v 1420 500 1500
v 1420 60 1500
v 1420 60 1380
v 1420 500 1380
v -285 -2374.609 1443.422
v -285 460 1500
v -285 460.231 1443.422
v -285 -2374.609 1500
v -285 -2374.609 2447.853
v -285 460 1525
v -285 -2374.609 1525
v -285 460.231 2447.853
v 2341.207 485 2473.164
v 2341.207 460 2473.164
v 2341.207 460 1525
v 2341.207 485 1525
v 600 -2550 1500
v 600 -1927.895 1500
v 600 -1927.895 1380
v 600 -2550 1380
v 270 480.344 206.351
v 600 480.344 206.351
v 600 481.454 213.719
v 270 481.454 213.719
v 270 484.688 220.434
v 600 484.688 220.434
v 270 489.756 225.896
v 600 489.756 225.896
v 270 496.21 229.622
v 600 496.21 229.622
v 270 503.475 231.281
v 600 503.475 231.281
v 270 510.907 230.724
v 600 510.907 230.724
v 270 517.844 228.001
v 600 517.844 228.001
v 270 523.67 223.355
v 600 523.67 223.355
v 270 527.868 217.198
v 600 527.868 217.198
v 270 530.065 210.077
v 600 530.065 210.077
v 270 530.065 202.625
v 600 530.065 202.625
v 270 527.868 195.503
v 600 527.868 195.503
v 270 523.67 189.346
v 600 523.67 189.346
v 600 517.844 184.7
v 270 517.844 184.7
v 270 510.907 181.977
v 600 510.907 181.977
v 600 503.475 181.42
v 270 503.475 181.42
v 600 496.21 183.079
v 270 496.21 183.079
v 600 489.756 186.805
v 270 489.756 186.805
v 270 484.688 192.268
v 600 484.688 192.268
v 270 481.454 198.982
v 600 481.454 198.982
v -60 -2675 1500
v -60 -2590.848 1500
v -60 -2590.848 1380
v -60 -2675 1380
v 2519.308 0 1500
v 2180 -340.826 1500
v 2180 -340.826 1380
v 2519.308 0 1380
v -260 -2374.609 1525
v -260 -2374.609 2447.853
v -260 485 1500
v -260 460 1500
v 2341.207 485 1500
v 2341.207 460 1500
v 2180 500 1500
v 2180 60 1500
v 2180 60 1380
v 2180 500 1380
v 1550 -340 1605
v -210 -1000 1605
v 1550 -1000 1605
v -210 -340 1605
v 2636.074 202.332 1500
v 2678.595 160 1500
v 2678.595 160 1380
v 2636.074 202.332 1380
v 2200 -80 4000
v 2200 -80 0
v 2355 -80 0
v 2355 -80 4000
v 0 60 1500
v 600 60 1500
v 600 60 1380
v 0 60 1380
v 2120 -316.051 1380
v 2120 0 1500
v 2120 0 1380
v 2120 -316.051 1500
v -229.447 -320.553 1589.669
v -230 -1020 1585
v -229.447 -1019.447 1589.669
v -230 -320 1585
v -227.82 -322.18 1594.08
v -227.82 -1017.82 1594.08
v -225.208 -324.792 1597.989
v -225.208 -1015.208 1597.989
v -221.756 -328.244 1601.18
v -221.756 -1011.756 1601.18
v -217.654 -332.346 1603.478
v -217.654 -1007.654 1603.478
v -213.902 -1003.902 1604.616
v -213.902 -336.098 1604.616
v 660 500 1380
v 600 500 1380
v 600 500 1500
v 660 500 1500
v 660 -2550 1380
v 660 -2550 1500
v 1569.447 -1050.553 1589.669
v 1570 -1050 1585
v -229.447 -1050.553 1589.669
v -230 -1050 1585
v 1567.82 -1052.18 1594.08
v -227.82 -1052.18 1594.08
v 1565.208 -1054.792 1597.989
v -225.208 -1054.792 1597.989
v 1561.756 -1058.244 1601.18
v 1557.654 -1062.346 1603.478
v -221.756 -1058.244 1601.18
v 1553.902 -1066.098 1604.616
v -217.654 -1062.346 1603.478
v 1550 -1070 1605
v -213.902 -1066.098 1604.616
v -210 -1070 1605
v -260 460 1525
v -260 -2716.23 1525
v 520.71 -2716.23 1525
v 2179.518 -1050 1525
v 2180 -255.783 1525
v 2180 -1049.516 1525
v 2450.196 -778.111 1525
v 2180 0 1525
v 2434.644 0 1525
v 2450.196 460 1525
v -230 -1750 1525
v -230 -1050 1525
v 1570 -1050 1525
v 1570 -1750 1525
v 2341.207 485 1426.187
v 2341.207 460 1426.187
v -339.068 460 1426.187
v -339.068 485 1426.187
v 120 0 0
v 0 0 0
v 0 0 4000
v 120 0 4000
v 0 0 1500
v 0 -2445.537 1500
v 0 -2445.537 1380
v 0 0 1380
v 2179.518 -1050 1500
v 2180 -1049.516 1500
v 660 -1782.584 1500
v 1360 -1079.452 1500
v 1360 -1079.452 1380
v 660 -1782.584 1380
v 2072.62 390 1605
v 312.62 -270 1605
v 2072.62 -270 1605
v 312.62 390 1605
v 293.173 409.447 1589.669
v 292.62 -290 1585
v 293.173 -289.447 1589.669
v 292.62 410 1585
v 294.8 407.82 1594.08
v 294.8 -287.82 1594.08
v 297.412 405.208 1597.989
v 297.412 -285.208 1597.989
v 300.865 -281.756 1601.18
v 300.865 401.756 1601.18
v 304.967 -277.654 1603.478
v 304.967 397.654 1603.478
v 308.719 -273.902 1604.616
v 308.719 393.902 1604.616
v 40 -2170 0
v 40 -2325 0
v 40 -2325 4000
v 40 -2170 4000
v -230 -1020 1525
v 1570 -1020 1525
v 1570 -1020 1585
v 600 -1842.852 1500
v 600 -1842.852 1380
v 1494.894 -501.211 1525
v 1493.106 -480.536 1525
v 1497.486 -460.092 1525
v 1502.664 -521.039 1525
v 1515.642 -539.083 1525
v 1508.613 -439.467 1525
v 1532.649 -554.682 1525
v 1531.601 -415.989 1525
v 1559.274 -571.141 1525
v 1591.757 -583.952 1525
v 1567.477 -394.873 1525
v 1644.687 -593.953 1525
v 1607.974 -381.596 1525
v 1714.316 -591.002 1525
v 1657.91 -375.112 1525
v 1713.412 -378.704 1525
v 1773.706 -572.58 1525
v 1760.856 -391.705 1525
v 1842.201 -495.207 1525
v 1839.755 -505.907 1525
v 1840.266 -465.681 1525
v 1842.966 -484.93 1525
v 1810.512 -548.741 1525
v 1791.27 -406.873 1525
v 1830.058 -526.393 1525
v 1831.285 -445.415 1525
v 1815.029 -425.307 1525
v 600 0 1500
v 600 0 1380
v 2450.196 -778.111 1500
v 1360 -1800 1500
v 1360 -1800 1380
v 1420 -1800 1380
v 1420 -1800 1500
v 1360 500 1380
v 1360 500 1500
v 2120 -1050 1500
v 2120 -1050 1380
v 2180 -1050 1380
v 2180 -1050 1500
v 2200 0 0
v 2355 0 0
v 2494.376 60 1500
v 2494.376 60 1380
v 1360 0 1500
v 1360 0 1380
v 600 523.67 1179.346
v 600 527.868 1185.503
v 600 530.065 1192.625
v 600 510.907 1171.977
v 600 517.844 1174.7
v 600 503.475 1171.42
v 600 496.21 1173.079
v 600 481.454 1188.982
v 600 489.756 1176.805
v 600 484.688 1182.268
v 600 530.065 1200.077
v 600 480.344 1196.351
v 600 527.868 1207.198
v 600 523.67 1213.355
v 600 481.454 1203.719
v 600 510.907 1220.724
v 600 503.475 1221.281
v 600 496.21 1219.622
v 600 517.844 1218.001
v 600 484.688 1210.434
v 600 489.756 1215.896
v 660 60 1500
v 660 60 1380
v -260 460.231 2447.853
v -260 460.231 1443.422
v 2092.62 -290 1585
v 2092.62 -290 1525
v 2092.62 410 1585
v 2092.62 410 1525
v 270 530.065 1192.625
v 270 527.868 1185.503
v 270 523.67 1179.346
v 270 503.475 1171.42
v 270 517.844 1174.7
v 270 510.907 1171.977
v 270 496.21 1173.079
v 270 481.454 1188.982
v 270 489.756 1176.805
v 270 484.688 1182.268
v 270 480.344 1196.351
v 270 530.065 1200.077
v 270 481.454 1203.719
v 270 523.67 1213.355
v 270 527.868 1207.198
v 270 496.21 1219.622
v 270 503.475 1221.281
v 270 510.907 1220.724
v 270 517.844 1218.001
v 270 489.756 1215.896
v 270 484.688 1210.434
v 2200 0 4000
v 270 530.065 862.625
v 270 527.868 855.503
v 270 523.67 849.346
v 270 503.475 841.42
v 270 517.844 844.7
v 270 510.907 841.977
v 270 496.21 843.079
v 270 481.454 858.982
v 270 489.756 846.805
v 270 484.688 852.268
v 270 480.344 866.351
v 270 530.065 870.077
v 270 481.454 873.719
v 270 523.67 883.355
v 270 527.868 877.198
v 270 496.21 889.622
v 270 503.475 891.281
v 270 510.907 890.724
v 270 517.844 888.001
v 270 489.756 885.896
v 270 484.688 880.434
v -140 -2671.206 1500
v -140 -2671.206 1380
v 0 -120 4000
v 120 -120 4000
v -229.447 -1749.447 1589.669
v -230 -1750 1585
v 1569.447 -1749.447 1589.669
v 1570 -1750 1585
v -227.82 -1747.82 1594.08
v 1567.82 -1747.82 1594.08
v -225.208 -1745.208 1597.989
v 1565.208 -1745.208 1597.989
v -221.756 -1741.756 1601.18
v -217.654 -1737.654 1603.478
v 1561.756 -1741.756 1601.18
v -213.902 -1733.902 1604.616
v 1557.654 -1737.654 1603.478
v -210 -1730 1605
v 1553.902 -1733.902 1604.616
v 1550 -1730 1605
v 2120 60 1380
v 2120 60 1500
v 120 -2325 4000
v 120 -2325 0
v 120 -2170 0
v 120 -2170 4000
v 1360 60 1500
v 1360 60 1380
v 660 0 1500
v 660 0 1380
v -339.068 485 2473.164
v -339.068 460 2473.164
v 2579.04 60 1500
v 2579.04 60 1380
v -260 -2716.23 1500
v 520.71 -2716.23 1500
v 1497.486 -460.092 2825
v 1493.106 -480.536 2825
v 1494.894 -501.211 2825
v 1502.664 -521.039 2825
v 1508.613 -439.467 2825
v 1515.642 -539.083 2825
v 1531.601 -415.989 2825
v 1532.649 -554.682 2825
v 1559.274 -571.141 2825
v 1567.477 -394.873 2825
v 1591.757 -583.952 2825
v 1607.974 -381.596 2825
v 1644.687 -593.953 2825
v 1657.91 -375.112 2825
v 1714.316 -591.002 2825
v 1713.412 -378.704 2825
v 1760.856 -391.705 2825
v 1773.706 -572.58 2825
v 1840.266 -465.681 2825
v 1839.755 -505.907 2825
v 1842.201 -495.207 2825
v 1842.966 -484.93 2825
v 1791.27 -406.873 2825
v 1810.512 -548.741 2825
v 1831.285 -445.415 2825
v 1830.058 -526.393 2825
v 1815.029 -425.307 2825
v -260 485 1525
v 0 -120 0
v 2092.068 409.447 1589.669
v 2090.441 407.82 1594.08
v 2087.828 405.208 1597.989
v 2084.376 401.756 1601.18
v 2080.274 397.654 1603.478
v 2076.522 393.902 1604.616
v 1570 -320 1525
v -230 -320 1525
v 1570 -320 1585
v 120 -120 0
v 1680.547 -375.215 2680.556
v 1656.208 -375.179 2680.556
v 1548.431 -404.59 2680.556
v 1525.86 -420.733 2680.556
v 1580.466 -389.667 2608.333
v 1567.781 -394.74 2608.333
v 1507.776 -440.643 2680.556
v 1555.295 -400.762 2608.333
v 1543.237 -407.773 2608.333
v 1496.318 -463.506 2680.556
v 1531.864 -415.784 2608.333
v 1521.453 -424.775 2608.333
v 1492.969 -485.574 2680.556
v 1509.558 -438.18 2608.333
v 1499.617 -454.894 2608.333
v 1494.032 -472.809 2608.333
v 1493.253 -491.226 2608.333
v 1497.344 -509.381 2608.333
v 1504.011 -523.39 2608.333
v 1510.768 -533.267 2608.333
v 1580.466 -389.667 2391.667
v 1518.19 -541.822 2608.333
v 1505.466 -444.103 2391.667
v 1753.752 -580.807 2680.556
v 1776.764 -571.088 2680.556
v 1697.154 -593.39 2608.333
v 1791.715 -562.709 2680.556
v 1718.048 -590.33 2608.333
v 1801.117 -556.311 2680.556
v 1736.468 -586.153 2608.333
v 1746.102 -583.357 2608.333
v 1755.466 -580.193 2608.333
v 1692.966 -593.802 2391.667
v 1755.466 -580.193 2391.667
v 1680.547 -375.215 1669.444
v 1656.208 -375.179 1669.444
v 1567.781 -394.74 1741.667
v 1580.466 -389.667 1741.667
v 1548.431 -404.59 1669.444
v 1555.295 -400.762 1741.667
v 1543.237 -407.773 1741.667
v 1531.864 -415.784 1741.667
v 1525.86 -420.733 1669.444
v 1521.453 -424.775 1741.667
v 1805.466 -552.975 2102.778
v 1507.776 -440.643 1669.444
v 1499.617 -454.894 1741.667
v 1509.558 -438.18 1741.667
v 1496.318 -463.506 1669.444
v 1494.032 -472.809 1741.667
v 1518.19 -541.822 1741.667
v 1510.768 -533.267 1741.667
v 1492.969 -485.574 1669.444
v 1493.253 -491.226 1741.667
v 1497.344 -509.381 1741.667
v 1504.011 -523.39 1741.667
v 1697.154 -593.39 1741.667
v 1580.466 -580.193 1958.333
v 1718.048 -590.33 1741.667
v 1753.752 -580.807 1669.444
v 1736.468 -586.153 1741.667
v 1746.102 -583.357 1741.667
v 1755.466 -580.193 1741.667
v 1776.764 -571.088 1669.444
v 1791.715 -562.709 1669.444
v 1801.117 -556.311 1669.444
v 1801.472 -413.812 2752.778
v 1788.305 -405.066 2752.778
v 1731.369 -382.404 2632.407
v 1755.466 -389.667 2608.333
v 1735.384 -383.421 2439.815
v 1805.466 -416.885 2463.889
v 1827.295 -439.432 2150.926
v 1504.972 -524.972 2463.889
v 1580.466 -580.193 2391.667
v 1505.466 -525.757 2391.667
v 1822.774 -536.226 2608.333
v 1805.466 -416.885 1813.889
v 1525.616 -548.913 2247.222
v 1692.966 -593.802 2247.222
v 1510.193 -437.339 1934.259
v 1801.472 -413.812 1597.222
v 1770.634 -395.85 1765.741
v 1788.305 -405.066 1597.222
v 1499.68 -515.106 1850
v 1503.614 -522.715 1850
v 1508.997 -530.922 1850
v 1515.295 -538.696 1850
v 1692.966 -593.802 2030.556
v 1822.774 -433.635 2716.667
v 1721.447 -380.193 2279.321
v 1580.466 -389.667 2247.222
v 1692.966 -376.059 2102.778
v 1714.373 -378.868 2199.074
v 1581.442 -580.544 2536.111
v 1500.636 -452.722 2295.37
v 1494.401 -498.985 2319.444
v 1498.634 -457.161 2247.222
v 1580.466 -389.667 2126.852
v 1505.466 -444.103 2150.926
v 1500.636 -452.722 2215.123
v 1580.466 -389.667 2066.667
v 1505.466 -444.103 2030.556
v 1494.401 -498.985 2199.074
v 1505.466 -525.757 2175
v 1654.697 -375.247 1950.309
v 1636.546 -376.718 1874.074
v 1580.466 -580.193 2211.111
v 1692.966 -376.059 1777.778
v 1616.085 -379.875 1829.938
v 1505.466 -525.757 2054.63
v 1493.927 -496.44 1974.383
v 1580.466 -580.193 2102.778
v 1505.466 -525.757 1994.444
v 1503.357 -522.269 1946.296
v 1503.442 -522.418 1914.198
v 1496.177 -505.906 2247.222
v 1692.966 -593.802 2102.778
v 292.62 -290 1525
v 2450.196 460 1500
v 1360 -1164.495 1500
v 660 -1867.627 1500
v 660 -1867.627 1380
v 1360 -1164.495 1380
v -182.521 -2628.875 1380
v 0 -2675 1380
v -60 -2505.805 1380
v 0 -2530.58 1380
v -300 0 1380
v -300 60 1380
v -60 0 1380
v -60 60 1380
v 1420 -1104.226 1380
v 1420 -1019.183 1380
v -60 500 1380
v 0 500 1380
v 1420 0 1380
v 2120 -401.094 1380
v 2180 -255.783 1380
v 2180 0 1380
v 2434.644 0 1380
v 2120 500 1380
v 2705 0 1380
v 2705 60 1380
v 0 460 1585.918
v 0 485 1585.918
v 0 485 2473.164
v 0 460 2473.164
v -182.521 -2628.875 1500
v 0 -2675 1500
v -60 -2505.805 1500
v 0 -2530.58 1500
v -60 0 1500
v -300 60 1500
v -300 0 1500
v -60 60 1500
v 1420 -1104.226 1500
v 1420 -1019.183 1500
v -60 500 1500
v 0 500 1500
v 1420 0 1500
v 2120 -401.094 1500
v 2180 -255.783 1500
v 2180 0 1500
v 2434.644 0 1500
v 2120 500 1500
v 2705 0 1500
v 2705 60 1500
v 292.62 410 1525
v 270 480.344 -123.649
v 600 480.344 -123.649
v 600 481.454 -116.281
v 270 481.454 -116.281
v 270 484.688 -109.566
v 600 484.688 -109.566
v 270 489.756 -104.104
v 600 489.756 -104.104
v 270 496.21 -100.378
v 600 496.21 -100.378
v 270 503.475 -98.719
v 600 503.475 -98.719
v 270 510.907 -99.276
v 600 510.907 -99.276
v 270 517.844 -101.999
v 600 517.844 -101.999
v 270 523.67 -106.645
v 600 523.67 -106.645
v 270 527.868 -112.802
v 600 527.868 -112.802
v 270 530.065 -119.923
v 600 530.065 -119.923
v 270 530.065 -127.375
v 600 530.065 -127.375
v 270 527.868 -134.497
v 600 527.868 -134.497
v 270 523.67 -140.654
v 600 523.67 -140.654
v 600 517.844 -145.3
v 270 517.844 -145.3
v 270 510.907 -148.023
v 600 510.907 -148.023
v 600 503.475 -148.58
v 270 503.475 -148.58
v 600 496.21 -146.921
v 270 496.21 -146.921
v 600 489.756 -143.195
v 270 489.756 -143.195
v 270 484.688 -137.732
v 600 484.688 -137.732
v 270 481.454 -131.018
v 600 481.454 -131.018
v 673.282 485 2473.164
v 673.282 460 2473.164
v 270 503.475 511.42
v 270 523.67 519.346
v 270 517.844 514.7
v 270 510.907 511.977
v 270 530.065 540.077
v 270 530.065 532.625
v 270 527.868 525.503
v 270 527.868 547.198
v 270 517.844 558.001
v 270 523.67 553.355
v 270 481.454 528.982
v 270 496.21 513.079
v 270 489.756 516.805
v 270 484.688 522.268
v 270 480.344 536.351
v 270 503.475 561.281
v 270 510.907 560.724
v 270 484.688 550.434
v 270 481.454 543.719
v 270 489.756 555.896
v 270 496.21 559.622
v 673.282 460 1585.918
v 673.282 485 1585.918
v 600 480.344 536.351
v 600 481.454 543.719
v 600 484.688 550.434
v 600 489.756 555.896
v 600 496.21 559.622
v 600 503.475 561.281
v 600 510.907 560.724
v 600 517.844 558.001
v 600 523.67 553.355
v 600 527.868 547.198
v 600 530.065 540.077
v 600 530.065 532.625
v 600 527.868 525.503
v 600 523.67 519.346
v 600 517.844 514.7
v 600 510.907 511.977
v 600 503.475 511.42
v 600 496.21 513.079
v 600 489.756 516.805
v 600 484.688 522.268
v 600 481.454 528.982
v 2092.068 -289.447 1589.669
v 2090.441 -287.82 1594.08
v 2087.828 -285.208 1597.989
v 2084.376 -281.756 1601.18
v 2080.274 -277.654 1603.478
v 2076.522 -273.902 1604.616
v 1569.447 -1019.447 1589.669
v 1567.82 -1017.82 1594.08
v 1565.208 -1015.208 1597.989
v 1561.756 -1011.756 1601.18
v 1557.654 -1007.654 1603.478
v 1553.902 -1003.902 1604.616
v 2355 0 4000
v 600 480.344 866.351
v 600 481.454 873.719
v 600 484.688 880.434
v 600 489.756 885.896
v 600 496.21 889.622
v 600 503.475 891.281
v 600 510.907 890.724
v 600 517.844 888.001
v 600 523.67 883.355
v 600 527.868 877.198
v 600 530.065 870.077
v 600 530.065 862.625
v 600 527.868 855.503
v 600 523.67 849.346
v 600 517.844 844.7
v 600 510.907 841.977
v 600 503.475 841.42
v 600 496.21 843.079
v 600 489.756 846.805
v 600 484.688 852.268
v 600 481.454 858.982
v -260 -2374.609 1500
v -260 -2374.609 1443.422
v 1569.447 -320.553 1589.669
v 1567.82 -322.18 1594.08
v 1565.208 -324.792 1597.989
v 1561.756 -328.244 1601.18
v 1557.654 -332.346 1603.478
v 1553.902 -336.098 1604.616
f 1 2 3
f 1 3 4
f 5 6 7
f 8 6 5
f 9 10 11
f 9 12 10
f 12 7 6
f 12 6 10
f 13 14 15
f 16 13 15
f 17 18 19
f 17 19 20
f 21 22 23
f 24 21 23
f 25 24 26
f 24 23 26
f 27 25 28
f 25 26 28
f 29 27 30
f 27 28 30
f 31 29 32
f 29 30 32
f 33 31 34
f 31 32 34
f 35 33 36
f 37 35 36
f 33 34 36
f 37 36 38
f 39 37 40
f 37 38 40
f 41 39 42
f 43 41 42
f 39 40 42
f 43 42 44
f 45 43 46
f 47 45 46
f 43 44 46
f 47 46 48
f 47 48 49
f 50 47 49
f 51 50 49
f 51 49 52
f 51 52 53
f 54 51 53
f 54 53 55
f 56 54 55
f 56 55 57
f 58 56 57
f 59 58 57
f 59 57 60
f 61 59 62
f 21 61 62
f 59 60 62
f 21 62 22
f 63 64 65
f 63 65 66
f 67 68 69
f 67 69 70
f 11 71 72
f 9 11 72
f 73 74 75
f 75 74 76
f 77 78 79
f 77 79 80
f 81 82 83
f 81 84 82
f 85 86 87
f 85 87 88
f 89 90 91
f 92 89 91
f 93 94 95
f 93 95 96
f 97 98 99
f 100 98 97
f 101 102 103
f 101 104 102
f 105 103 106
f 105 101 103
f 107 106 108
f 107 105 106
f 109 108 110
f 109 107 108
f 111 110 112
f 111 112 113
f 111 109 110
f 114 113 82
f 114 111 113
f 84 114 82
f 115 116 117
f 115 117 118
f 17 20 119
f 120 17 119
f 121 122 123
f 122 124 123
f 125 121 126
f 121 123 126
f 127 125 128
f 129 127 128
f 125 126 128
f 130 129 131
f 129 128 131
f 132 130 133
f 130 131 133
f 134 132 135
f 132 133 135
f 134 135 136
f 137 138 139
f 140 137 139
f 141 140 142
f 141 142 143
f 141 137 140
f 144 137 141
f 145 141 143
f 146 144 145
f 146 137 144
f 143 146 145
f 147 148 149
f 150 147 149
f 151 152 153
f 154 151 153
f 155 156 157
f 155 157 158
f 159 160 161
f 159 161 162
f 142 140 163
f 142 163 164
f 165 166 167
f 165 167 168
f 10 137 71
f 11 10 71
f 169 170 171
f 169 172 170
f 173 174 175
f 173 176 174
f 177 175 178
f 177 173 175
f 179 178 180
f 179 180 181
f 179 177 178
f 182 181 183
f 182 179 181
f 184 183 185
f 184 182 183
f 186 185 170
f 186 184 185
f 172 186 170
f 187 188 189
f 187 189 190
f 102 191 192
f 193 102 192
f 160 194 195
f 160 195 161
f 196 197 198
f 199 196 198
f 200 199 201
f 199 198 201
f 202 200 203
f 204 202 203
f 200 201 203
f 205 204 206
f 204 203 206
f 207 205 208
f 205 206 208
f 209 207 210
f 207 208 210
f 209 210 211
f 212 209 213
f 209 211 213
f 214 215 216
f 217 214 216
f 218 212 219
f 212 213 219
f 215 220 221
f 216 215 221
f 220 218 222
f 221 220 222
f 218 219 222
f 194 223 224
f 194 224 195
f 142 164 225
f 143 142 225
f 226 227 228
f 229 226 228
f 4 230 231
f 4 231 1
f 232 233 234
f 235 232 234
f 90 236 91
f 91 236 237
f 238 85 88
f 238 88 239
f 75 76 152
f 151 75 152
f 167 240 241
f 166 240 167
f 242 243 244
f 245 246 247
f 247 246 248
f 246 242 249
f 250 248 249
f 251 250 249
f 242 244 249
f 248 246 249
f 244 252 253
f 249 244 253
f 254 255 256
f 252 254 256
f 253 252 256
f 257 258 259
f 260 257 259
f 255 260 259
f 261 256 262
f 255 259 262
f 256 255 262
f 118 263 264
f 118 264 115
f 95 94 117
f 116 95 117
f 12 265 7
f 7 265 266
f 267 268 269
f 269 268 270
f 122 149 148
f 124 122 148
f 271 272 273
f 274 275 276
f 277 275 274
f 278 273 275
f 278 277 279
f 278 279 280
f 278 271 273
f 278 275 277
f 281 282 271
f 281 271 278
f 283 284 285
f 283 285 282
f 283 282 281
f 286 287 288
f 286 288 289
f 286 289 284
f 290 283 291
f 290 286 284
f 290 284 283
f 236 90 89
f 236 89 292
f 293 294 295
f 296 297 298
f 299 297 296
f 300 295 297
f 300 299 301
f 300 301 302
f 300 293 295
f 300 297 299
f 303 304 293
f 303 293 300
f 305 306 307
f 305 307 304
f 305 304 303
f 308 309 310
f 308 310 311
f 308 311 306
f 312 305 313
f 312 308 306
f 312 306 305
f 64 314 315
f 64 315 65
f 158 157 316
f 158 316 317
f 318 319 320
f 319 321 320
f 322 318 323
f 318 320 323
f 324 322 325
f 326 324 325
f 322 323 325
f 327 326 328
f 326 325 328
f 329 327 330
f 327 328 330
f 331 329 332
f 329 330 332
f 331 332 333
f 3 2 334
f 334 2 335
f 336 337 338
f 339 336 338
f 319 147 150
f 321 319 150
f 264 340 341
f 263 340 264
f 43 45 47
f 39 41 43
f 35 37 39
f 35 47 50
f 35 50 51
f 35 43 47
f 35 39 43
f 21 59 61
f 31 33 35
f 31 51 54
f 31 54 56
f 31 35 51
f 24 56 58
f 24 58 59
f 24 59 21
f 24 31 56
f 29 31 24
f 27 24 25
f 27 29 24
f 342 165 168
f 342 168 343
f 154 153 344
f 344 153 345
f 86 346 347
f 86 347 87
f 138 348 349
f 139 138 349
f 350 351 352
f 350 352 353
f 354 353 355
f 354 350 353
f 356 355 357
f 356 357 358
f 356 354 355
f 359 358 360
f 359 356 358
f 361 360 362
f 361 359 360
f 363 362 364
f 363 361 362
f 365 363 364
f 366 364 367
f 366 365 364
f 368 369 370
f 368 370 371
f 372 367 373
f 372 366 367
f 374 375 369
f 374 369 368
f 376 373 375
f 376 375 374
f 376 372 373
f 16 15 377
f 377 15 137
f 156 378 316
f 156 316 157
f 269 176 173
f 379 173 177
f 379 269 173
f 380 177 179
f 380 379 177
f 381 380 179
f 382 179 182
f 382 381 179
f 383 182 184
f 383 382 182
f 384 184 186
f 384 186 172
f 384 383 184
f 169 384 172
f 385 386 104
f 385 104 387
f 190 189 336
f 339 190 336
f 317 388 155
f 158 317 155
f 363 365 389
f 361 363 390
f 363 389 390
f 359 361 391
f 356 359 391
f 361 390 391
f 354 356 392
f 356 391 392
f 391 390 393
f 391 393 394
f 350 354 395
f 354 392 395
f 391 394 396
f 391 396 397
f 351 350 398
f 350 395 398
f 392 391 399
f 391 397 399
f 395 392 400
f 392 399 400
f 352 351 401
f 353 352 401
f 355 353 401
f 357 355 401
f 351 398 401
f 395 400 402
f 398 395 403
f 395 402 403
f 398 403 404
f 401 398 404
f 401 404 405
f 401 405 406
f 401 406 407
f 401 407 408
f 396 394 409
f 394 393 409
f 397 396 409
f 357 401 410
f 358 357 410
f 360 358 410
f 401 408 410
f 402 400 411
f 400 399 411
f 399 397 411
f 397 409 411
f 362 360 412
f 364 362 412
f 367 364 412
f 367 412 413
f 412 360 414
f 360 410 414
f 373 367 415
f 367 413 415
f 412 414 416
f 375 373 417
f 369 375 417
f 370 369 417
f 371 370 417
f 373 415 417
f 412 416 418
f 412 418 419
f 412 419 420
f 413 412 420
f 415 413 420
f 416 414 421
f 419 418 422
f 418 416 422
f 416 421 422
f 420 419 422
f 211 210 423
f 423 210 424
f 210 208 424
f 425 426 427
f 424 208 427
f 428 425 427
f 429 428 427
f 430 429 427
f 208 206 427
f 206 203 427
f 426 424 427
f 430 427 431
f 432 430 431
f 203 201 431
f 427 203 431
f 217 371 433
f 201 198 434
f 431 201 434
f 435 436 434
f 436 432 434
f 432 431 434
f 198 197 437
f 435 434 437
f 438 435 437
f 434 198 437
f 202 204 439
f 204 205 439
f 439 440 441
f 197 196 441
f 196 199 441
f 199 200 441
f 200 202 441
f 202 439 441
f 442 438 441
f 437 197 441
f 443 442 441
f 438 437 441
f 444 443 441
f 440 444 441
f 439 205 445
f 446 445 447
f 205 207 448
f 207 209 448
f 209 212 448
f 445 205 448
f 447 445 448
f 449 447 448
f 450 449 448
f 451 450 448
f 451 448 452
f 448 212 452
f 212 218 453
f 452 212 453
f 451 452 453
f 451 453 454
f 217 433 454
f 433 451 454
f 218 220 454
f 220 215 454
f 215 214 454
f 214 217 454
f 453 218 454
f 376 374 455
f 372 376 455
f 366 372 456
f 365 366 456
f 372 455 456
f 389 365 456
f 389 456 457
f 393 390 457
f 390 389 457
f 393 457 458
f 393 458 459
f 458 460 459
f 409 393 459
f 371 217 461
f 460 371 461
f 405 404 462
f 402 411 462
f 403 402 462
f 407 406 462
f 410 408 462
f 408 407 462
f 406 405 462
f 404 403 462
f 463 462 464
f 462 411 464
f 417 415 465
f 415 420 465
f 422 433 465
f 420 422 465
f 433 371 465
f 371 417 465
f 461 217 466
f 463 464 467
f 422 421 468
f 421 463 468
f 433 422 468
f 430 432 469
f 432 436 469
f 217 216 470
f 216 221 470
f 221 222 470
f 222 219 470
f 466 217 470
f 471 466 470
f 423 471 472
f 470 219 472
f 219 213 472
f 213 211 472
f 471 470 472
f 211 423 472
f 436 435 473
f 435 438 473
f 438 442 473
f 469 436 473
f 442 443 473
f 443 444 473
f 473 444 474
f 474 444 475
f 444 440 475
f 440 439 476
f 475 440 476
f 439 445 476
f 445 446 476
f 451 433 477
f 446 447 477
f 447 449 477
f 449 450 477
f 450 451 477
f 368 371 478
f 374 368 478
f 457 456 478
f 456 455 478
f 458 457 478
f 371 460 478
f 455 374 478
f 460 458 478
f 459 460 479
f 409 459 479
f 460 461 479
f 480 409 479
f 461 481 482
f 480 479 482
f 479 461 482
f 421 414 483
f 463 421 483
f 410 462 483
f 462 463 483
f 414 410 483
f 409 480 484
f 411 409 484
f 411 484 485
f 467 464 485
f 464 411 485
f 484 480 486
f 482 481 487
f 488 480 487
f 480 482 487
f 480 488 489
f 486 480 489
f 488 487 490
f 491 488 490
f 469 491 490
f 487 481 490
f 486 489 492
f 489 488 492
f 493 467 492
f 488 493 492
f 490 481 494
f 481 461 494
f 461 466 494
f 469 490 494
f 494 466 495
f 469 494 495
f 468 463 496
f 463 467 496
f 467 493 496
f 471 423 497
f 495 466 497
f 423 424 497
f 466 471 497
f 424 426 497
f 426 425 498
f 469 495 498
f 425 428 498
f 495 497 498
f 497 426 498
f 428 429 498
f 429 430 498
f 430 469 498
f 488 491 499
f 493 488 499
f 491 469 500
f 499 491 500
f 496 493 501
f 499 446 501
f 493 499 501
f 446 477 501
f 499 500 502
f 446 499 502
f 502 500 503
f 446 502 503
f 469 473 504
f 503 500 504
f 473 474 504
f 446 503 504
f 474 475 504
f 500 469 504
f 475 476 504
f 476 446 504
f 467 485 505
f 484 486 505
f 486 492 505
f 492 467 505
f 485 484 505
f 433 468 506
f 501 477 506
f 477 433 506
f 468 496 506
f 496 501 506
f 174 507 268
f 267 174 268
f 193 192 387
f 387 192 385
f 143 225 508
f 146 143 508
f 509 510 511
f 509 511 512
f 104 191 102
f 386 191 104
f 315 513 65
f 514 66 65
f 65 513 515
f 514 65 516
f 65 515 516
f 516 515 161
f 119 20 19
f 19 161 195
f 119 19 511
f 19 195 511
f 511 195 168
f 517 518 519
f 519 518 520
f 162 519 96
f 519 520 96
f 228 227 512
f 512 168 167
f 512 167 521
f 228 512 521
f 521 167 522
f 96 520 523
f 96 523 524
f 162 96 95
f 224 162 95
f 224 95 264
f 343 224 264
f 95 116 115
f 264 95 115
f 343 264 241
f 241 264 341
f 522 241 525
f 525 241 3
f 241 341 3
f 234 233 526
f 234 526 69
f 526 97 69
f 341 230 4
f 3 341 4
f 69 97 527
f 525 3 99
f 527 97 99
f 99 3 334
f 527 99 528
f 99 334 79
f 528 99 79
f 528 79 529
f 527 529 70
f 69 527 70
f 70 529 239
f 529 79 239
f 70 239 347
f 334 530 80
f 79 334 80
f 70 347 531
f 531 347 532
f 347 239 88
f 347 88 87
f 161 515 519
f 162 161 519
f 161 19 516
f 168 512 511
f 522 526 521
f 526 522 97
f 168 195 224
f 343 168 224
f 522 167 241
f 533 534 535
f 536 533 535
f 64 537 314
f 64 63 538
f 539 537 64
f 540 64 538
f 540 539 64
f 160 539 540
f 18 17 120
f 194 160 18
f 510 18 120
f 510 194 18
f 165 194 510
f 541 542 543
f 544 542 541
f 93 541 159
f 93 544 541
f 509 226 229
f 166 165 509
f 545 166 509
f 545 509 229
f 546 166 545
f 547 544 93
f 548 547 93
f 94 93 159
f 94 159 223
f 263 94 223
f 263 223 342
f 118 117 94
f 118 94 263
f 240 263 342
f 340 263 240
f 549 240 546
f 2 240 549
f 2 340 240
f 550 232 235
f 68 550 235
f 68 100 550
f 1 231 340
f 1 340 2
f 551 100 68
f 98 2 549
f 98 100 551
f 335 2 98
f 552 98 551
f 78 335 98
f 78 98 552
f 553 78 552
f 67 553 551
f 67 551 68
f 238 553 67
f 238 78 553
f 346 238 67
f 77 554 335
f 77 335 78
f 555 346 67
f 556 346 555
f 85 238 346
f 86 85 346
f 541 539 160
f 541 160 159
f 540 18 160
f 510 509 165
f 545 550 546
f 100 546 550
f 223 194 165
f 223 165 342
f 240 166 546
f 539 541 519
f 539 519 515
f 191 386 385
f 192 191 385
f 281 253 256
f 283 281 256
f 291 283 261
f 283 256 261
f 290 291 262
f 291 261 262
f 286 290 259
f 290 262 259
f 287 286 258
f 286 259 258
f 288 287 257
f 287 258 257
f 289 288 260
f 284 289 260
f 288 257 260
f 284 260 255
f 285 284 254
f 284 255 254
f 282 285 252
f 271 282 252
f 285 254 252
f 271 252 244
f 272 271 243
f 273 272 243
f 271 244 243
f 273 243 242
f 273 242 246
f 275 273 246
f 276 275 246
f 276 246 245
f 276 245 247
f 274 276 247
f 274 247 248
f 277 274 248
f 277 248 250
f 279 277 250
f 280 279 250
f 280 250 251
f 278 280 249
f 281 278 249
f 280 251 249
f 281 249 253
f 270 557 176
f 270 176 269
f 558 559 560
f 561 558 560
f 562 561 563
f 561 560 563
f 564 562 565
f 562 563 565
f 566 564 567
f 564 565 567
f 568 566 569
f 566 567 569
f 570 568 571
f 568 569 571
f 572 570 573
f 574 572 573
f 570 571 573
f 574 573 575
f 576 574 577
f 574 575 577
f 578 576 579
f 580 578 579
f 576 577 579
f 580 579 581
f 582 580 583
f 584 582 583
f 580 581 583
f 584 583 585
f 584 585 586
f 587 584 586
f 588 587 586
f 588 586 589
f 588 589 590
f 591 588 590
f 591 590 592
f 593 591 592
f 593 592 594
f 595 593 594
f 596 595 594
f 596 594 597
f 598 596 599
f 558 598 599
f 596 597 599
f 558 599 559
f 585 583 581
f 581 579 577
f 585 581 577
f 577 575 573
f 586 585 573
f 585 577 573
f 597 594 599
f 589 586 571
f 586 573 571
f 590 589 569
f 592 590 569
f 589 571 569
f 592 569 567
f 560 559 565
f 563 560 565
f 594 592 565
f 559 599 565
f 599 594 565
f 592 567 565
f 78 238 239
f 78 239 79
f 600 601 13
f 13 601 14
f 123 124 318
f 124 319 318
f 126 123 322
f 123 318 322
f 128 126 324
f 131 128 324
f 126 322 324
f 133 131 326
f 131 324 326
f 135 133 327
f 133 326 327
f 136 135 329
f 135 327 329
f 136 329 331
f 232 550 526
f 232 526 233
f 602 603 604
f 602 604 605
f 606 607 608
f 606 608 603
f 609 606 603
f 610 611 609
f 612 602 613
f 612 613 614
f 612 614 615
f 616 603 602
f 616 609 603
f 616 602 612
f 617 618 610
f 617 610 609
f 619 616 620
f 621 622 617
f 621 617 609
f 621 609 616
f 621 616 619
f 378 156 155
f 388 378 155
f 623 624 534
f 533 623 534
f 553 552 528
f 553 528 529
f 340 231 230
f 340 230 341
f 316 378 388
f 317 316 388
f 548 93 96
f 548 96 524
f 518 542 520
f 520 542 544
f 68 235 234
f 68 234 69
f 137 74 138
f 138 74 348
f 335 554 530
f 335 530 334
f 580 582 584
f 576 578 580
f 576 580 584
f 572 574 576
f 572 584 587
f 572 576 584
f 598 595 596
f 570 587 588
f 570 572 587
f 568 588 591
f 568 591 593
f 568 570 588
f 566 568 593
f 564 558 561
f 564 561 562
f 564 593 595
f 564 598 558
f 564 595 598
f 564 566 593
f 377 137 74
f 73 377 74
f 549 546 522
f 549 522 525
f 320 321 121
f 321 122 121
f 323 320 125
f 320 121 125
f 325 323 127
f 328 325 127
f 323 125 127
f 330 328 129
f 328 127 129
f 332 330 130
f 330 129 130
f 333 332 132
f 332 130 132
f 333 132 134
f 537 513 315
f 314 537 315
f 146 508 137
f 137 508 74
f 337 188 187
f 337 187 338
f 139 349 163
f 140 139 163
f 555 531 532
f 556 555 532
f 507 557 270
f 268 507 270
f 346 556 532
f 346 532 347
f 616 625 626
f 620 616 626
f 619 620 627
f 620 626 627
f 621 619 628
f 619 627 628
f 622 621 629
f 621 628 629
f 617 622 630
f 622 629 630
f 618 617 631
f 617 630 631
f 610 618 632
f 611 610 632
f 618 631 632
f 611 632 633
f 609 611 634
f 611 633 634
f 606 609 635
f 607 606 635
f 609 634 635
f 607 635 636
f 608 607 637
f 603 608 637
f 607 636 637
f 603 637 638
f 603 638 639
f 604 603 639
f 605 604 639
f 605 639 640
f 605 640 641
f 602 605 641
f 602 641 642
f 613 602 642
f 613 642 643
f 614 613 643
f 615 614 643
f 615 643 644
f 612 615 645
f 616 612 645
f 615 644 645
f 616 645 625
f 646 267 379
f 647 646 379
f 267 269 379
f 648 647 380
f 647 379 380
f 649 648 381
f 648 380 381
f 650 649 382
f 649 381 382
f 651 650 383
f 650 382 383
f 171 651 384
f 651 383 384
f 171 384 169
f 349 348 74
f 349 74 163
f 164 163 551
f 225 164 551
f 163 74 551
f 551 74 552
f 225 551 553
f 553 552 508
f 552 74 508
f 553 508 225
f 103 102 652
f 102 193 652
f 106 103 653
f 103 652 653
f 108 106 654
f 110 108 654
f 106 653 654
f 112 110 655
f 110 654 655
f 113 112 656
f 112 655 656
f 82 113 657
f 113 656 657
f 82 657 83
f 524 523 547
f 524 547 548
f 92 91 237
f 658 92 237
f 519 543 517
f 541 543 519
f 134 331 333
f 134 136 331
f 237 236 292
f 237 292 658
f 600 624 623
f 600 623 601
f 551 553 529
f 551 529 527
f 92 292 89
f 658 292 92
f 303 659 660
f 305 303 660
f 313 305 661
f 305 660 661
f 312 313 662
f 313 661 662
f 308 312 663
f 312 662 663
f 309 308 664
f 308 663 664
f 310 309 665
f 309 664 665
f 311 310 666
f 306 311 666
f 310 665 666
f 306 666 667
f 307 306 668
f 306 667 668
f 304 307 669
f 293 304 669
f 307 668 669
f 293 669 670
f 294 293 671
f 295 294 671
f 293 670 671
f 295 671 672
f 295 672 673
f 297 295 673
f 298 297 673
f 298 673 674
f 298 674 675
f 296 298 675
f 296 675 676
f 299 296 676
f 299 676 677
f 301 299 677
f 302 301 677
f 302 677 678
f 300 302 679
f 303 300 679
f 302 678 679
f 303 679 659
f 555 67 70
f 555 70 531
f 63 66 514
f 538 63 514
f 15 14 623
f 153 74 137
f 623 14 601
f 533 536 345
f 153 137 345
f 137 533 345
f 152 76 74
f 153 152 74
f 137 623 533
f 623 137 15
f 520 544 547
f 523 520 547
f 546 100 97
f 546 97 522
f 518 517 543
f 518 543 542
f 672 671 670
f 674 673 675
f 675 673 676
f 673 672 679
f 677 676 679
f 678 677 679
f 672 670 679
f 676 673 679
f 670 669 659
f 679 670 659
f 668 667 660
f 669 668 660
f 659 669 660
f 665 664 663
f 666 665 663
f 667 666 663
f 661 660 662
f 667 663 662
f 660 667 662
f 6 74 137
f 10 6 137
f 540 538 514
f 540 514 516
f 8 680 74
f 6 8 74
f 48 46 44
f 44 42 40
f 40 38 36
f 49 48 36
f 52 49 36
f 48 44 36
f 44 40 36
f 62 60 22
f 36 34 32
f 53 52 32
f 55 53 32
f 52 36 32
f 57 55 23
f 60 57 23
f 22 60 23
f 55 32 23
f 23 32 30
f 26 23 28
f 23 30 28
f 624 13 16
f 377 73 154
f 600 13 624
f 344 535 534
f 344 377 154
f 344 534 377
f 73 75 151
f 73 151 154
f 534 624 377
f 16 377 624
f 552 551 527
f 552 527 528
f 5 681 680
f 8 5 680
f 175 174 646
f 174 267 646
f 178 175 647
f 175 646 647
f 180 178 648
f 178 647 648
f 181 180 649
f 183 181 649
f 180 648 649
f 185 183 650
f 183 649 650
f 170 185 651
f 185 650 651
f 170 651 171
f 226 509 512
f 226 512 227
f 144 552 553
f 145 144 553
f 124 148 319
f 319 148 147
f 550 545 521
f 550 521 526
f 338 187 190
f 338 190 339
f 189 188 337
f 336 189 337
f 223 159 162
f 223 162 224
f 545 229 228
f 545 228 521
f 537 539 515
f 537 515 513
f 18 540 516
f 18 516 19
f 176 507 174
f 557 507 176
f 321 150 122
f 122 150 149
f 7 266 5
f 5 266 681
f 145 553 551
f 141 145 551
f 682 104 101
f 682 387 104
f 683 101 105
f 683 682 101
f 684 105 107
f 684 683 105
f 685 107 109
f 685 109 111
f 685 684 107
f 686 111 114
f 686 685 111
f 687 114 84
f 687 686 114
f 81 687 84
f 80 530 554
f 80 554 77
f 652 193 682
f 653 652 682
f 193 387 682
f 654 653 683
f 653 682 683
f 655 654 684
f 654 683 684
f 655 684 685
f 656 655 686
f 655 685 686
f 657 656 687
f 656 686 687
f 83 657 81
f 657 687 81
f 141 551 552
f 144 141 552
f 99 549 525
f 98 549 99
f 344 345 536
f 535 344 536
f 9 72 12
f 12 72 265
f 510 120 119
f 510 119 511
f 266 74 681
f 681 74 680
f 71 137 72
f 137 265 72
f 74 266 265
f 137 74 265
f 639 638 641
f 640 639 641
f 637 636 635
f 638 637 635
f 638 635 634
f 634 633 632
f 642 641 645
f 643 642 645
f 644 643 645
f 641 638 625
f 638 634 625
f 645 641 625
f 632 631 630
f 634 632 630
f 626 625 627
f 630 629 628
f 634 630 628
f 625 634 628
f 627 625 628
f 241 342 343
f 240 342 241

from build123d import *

# Parameters (mm, degrees)
F0_W      = 80
F0_H      = 155
F1_DEPTH  = 4000
F0_W_2    = 120
F0_H_2    = 120
F0_W_3    = 155
F0_H_3    = 80
F3_W      = 600
F3_H      = 60
F3_W_2    = 60
F3_H_2    = 440
F3_W_3    = 240
F3_W_4    = 700
F4_DEPTH  = 120
F5_W      = 200
F5_H      = 400
F5_W_2    = 270.1964569092
F5_W_3    = 700
F5_W_4    = 600
F6_DEPTH  = 25
F7_W      = 1800
F7_H      = 700
F8_DEPTH  = 80
F9_R      = 20
F9_2_R    = 20
F9_3_R    = 20
F13_DEPTH = 1300
F15_DEPTH = 25
F17_DEPTH = 25
F21_W     = 673.2819676399
F21_H     = 887.2460126877
F22_DEPTH = 25
F23_R     = 25
F24_DEPTH = 330


# Not quite as in the source:
# - a feature names something its author has since deleted; it is built from what else it names


with BuildPart() as f1:
    # F0 (on Top) → F1 (new body)
    with BuildSketch(Plane.XY):
        with Locations((80, -2247.5)):
            Rectangle(F0_W, F0_H)
    extrude(amount=F1_DEPTH)


with BuildPart() as f1b:
    # F0 (on Top) → F1, piece 2 (new body)
    with BuildSketch(Plane.XY):
        with Locations((60, -60)):
            Rectangle(F0_W_2, F0_H_2)
    extrude(amount=F1_DEPTH)


with BuildPart() as f1c:
    # F0 (on Top) → F1, piece 3 (new body)
    with BuildSketch(Plane.XY):
        with Locations((2277.5, -40)):
            Rectangle(F0_W_3, F0_H_3)
    extrude(amount=F1_DEPTH)


with BuildPart() as f4:
    # F3 (on offset) → F4 (new body)
    with BuildSketch(Plane.XY.offset(1500)):
        Polygon((-60, -2590.8482220543), (0, -2530.5797656785), (0, -2445.5369127517), (-60, -2505.8053691275), align=None)
        Polygon((-60, -2675), (0, -2675), (0, -2530.5797656785), (-60, -2590.8482220543), align=None)
        Polygon((-140, -2671.2061638888), (-60, -2590.8482220543), (-60, -2505.8053691275), (-182.5210027427, -2628.8745642763), align=None)
        Polygon((0, -2445.5369127517), (0, -2530.5797656785), (600, -1927.8952019201), (600, -1842.8523489933), align=None)
        Polygon((-60, -2505.8053691275), (0, -2445.5369127517), (0, 0), (-60, 0), align=None)
        with Locations((300, 30)):
            Rectangle(F3_W, F3_H)
        Polygon((2579.0404348737, 60), (2519.3076954527, 0), (2705, 0), (2705, 60), align=None)
        Polygon((2494.3763919822, 60), (2579.0404348737, 60), (2678.5950005752, 160), (2636.0739978325, 202.3315996125), align=None)
        Polygon((2434.6436525612, 0), (2519.3076954527, 0), (2579.0404348737, 60), (2494.3763919822, 60), align=None)
        with Locations((-30, 280)):
            Rectangle(F3_W_2, F3_H_2)
        with Locations((-180, 30)):
            Rectangle(F3_W_3, F3_H)
        with Locations((-30, 30)):
            Rectangle(F3_W_2, F3_H)
        Polygon((600, 0), (600, -1842.8523489933), (660, -1782.5838926174), (660, 0), align=None)
        Polygon((660, -1867.6267455442), (600, -1927.8952019201), (600, -2550), (660, -2550), align=None)
        Polygon((1420, -1104.2262981169), (1360, -1164.4947544928), (1360, -1800), (1420, -1800), align=None)
        Polygon((1360, 0), (1360, -1079.451901566), (1420, -1019.1834451902), (1420, 0), align=None)
        Polygon((660, -1782.5838926174), (660, -1867.6267455442), (1360, -1164.4947544928), (1360, -1079.451901566), align=None)
        Polygon((1420, -1019.1834451902), (1420, -1104.2262981169), (2120, -401.0943070655), (2120, -316.0514541387), align=None)
        Polygon((2180, -340.8258506896), (2120, -401.0943070655), (2120, -1050), (2180, -1050), align=None)
        Polygon((600, -1842.8523489933), (600, -1927.8952019201), (660, -1867.6267455442), (660, -1782.5838926174), align=None)
        Polygon((1360, -1079.451901566), (1360, -1164.4947544928), (1420, -1104.2262981169), (1420, -1019.1834451902), align=None)
        Polygon((2120, -316.0514541387), (2120, -401.0943070655), (2180, -340.8258506896), (2180, -255.7829977629), align=None)
        Polygon((2180, -255.7829977629), (2180, -340.8258506896), (2519.3076954527, 0), (2434.6436525612, 0), align=None)
        Polygon((2180, 60), (2180, 0), (2434.6436525612, 0), (2494.3763919822, 60), align=None)
        with Locations((2150, 30)):
            Rectangle(F3_W_2, F3_H)
        Polygon((2120, 0), (2120, -316.0514541387), (2180, -255.7829977629), (2180, 0), align=None)
        with Locations((2150, 280)):
            Rectangle(F3_W_2, F3_H_2)
        with Locations((1390, 280)):
            Rectangle(F3_W_2, F3_H_2)
        with Locations((1390, 30)):
            Rectangle(F3_W_2, F3_H)
        with Locations((1010, 30)):
            Rectangle(F3_W_4, F3_H)
        with Locations((630, 30)):
            Rectangle(F3_W_2, F3_H)
        with Locations((630, 280)):
            Rectangle(F3_W_2, F3_H_2)
        with Locations((1770, 30)):
            Rectangle(F3_W_4, F3_H)
    extrude(amount=-F4_DEPTH)


with BuildPart() as f6:
    # F5 (on face) → F6 (new body)
    with BuildSketch(Plane.XY.offset(1500)):
        with Locations((-160, 260)):
            Rectangle(F5_W, F5_H)
        Polygon((-60, 60), (-260, 60), (-260, 0), (-60, 0), (-60, -2505.8053691275), (-182.5210027427, -2628.8745642763), (-140, -2671.2061638888), (-60, -2590.8482220543), (-60, -2675), (0, -2675), (0, -2530.5797656785), (600, -1927.8952019201), (600, -2550), (660, -2550), (660, -1867.6267455442), (1360, -1164.4947544928), (1360, -1800), (1420, -1800), (1420, -1104.2262981169), (2120, -401.0943070655), (2120, -1050), (2179.5184463486, -1050), (2180, -1049.5162917462), (2180, -340.8258506896), (2450.1964569092, -69.4204610874), (2450.1964569092, 60), (2180, 60), (2180, 460), (2120, 460), (2120, 60), (1420, 60), (1420, 460), (1360, 460), (1360, 60), (660, 60), (660, 460), (600, 460), (600, 60), (0, 60), (0, 460), (-60, 460), align=None)
        Polygon((0, -2445.5369127517), (0, 0), (600, 0), (600, -1842.8523489933), align=None, mode=Mode.SUBTRACT)
        Polygon((1360, -1079.451901566), (660, -1782.5838926174), (660, 0), (1360, 0), align=None, mode=Mode.SUBTRACT)
        Polygon((1420, 0), (2120, 0), (2120, -316.0514541387), (1420, -1019.1834451902), align=None, mode=Mode.SUBTRACT)
        Polygon((2180, 0), (2434.6436525612, 0), (2180, -255.7829977629), align=None, mode=Mode.SUBTRACT)
        with Locations((2315.0982284546, 260)):
            Rectangle(F5_W_2, F5_H)
        Polygon((-60, 0), (-260, 0), (-260, -2716.2301540375), (520.7102529082, -2716.2301540375), (2179.5184463486, -1050), (2120, -1050), (2120, -401.0943070655), (1420, -1104.2262981169), (1420, -1800), (1360, -1800), (1360, -1164.4947544928), (660, -1867.6267455442), (660, -2550), (600, -2550), (600, -1927.8952019201), (0, -2530.5797656785), (0, -2675), (-60, -2675), (-60, -2590.8482220543), (-140, -2671.2061638888), (-182.5210027427, -2628.8745642763), (-60, -2505.8053691275), align=None)
        Polygon((2180, -340.8258506896), (2180, -1049.5162917462), (2450.1964569092, -778.1109021439), (2450.1964569092, -69.4204610874), align=None)
        Polygon((660, 0), (660, -1782.5838926174), (1360, -1079.451901566), (1360, 0), align=None)
        Polygon((2120, -316.0514541387), (2120, 0), (1420, 0), (1420, -1019.1834451902), align=None)
        with Locations((1770, 260)):
            Rectangle(F5_W_3, F5_H)
        with Locations((1010, 260)):
            Rectangle(F5_W_3, F5_H)
        with Locations((300, 260)):
            Rectangle(F5_W_4, F5_H)
        Polygon((600, 0), (0, 0), (0, -2445.5369127517), (600, -1842.8523489933), align=None)
    extrude(amount=F6_DEPTH)


with BuildPart() as f8:
    # F7 (on face) → F8 (new body)
    with BuildSketch(Plane.XY.offset(1525)):
        with Locations((1192.6203727722, 60)):
            Rectangle(F7_W, F7_H)
    extrude(amount=F8_DEPTH)

    # F9#3
    f9_3_edges = [f8.edges().sort_by_distance(p)[0] for p in [
        (1192.620373, -290, 1605),
        (292.620373, 60, 1605),
        (1192.620373, 410, 1605),
        (2092.620373, 60, 1605),
    ]]
    fillet(f9_3_edges, radius=F9_3_R)


with BuildPart() as f8b:
    # F7 (on face) → F8, piece 2 (new body)
    with BuildSketch(Plane.XY.offset(1525)):
        with Locations((670, -670)):
            Rectangle(F7_W, F7_H)
    extrude(amount=F8_DEPTH)

    # F9#2
    f9_2_edges = [f8b.edges().sort_by_distance(p)[0] for p in [
        (670, -1020, 1605),
        (1570, -670, 1605),
        (670, -320, 1605),
        (-230, -670, 1605),
    ]]
    fillet(f9_2_edges, radius=F9_2_R)


with BuildPart() as f8c:
    # F7 (on face) → F8, piece 3 (new body)
    with BuildSketch(Plane.XY.offset(1525)):
        Polygon((1570, -1050), (-230, -1050), (-230, -1750), (1482.6364864377, -1750), (1570, -1662.2455982339), align=None)
        Polygon((1570, -1750), (1570, -1662.2455982339), (1482.6364864377, -1750), align=None)
    extrude(amount=F8_DEPTH)

    # F9
    f9_edges = [f8c.edges().sort_by_distance(p)[0] for p in [
        (670, -1750, 1605),
        (-230, -1400, 1605),
        (670, -1050, 1605),
        (1570, -1400, 1605),
    ]]
    fillet(f9_edges, radius=F9_R)


with BuildPart() as f13:
    # F12 (on face) → F13 (new body)
    with BuildSketch(Plane.XY.offset(1525)):
        with BuildLine():
            add(Edge.make_bspline(
                [(1842.9663658142, -484.9302768707), (1842.9663658142, -294.4046880382), (1580.4663658142, -389.6674824544), (1317.9663658142, -484.9302768707), (1580.4663658142, -580.193071287), (1842.9663658142, -675.4558657033), (1842.9663658142, -484.9302768707)],
                knots=[0, 0, 0, 2.0943951024, 2.0943951024, 4.1887902048, 4.1887902048, 6.2831853072, 6.2831853072, 6.2831853072], degree=2, weights=[1, 0.5, 1, 0.5, 1, 0.5, 1]))
        make_face()
    extrude(amount=F13_DEPTH)


with BuildPart() as f15:
    # F14 (on face) → F15 (new body)
    with BuildSketch(Plane(origin=(0, 460, 0), x_dir=(-1, 0, 0), z_dir=(0, 1, 0))):
        Polygon((-2341.2070274353, 1500), (-2341.2070274353, 1426.1865615845), (339.0676081181, 1426.1865615845), (339.0676081181, 2473.1640815735), (-2341.2070274353, 2473.1640815735), (-2341.2070274353, 1525), (260, 1525), (260, 1500), align=None)
    extrude(amount=F15_DEPTH)

    # F21 (on face) → F22 (cut)
    with BuildSketch(Plane(origin=(0, 485, 0), x_dir=(-1, 0, 0), z_dir=(0, 1, 0))):
        with Locations((-336.64098382, 2029.5410752296)):
            Rectangle(F21_W, F21_H)
    extrude(amount=-F22_DEPTH, mode=Mode.SUBTRACT)


with BuildPart() as f17:
    # F16 (on face) → F17 (new body)
    with BuildSketch(Plane(origin=(-260, 0, 0), x_dir=(0, -1, 0), z_dir=(-1, 0, 0))):
        Polygon((-460.2313935757, 2447.8528499603), (-460.2313935757, 1443.4218406677), (2374.6094703674, 1443.4218406677), (2374.6094703674, 1500), (-460, 1500), (-460, 1525), (2374.6094703674, 1525), (2374.6094703674, 2447.8528499603), align=None)
    extrude(amount=F17_DEPTH)


with BuildPart() as f24:
    # F23 (on face) → F24 (new body)
    with BuildSketch(Plane(origin=(600, 0, 0), x_dir=(0, -1, 0), z_dir=(-1, 0, 0))):
        with Locations((-505.343735218, 1196.3505744934)):
            Circle(F23_R)
    extrude(amount=F24_DEPTH)


with BuildPart() as f24b:
    # F23 (on face) → F24, piece 2 (new body)
    with BuildSketch(Plane(origin=(600, 0, 0), x_dir=(0, -1, 0), z_dir=(-1, 0, 0))):
        with Locations((-505.343735218, 866.3505744934)):
            Circle(F23_R)
    extrude(amount=F24_DEPTH)


with BuildPart() as f24c:
    # F23 (on face) → F24, piece 3 (new body)
    with BuildSketch(Plane(origin=(600, 0, 0), x_dir=(0, -1, 0), z_dir=(-1, 0, 0))):
        with Locations((-505.343735218, 536.3505744934)):
            Circle(F23_R)
    extrude(amount=F24_DEPTH)


with BuildPart() as f24d:
    # F23 (on face) → F24, piece 4 (new body)
    with BuildSketch(Plane(origin=(600, 0, 0), x_dir=(0, -1, 0), z_dir=(-1, 0, 0))):
        with Locations((-505.343735218, 206.3505744934)):
            Circle(F23_R)
    extrude(amount=F24_DEPTH)


with BuildPart() as f24e:
    # F23 (on face) → F24, piece 5 (new body)
    with BuildSketch(Plane(origin=(600, 0, 0), x_dir=(0, -1, 0), z_dir=(-1, 0, 0))):
        with Locations((-505.343735218, -123.6494255066)):
            Circle(F23_R)
    extrude(amount=F24_DEPTH)


solid = Compound([f1.part, f1b.part, f1c.part, f4.part, f6.part, f8.part, f8b.part, f8c.part, f13.part, f15.part, f17.part, f24.part, f24b.part, f24c.part, f24d.part, f24e.part])
